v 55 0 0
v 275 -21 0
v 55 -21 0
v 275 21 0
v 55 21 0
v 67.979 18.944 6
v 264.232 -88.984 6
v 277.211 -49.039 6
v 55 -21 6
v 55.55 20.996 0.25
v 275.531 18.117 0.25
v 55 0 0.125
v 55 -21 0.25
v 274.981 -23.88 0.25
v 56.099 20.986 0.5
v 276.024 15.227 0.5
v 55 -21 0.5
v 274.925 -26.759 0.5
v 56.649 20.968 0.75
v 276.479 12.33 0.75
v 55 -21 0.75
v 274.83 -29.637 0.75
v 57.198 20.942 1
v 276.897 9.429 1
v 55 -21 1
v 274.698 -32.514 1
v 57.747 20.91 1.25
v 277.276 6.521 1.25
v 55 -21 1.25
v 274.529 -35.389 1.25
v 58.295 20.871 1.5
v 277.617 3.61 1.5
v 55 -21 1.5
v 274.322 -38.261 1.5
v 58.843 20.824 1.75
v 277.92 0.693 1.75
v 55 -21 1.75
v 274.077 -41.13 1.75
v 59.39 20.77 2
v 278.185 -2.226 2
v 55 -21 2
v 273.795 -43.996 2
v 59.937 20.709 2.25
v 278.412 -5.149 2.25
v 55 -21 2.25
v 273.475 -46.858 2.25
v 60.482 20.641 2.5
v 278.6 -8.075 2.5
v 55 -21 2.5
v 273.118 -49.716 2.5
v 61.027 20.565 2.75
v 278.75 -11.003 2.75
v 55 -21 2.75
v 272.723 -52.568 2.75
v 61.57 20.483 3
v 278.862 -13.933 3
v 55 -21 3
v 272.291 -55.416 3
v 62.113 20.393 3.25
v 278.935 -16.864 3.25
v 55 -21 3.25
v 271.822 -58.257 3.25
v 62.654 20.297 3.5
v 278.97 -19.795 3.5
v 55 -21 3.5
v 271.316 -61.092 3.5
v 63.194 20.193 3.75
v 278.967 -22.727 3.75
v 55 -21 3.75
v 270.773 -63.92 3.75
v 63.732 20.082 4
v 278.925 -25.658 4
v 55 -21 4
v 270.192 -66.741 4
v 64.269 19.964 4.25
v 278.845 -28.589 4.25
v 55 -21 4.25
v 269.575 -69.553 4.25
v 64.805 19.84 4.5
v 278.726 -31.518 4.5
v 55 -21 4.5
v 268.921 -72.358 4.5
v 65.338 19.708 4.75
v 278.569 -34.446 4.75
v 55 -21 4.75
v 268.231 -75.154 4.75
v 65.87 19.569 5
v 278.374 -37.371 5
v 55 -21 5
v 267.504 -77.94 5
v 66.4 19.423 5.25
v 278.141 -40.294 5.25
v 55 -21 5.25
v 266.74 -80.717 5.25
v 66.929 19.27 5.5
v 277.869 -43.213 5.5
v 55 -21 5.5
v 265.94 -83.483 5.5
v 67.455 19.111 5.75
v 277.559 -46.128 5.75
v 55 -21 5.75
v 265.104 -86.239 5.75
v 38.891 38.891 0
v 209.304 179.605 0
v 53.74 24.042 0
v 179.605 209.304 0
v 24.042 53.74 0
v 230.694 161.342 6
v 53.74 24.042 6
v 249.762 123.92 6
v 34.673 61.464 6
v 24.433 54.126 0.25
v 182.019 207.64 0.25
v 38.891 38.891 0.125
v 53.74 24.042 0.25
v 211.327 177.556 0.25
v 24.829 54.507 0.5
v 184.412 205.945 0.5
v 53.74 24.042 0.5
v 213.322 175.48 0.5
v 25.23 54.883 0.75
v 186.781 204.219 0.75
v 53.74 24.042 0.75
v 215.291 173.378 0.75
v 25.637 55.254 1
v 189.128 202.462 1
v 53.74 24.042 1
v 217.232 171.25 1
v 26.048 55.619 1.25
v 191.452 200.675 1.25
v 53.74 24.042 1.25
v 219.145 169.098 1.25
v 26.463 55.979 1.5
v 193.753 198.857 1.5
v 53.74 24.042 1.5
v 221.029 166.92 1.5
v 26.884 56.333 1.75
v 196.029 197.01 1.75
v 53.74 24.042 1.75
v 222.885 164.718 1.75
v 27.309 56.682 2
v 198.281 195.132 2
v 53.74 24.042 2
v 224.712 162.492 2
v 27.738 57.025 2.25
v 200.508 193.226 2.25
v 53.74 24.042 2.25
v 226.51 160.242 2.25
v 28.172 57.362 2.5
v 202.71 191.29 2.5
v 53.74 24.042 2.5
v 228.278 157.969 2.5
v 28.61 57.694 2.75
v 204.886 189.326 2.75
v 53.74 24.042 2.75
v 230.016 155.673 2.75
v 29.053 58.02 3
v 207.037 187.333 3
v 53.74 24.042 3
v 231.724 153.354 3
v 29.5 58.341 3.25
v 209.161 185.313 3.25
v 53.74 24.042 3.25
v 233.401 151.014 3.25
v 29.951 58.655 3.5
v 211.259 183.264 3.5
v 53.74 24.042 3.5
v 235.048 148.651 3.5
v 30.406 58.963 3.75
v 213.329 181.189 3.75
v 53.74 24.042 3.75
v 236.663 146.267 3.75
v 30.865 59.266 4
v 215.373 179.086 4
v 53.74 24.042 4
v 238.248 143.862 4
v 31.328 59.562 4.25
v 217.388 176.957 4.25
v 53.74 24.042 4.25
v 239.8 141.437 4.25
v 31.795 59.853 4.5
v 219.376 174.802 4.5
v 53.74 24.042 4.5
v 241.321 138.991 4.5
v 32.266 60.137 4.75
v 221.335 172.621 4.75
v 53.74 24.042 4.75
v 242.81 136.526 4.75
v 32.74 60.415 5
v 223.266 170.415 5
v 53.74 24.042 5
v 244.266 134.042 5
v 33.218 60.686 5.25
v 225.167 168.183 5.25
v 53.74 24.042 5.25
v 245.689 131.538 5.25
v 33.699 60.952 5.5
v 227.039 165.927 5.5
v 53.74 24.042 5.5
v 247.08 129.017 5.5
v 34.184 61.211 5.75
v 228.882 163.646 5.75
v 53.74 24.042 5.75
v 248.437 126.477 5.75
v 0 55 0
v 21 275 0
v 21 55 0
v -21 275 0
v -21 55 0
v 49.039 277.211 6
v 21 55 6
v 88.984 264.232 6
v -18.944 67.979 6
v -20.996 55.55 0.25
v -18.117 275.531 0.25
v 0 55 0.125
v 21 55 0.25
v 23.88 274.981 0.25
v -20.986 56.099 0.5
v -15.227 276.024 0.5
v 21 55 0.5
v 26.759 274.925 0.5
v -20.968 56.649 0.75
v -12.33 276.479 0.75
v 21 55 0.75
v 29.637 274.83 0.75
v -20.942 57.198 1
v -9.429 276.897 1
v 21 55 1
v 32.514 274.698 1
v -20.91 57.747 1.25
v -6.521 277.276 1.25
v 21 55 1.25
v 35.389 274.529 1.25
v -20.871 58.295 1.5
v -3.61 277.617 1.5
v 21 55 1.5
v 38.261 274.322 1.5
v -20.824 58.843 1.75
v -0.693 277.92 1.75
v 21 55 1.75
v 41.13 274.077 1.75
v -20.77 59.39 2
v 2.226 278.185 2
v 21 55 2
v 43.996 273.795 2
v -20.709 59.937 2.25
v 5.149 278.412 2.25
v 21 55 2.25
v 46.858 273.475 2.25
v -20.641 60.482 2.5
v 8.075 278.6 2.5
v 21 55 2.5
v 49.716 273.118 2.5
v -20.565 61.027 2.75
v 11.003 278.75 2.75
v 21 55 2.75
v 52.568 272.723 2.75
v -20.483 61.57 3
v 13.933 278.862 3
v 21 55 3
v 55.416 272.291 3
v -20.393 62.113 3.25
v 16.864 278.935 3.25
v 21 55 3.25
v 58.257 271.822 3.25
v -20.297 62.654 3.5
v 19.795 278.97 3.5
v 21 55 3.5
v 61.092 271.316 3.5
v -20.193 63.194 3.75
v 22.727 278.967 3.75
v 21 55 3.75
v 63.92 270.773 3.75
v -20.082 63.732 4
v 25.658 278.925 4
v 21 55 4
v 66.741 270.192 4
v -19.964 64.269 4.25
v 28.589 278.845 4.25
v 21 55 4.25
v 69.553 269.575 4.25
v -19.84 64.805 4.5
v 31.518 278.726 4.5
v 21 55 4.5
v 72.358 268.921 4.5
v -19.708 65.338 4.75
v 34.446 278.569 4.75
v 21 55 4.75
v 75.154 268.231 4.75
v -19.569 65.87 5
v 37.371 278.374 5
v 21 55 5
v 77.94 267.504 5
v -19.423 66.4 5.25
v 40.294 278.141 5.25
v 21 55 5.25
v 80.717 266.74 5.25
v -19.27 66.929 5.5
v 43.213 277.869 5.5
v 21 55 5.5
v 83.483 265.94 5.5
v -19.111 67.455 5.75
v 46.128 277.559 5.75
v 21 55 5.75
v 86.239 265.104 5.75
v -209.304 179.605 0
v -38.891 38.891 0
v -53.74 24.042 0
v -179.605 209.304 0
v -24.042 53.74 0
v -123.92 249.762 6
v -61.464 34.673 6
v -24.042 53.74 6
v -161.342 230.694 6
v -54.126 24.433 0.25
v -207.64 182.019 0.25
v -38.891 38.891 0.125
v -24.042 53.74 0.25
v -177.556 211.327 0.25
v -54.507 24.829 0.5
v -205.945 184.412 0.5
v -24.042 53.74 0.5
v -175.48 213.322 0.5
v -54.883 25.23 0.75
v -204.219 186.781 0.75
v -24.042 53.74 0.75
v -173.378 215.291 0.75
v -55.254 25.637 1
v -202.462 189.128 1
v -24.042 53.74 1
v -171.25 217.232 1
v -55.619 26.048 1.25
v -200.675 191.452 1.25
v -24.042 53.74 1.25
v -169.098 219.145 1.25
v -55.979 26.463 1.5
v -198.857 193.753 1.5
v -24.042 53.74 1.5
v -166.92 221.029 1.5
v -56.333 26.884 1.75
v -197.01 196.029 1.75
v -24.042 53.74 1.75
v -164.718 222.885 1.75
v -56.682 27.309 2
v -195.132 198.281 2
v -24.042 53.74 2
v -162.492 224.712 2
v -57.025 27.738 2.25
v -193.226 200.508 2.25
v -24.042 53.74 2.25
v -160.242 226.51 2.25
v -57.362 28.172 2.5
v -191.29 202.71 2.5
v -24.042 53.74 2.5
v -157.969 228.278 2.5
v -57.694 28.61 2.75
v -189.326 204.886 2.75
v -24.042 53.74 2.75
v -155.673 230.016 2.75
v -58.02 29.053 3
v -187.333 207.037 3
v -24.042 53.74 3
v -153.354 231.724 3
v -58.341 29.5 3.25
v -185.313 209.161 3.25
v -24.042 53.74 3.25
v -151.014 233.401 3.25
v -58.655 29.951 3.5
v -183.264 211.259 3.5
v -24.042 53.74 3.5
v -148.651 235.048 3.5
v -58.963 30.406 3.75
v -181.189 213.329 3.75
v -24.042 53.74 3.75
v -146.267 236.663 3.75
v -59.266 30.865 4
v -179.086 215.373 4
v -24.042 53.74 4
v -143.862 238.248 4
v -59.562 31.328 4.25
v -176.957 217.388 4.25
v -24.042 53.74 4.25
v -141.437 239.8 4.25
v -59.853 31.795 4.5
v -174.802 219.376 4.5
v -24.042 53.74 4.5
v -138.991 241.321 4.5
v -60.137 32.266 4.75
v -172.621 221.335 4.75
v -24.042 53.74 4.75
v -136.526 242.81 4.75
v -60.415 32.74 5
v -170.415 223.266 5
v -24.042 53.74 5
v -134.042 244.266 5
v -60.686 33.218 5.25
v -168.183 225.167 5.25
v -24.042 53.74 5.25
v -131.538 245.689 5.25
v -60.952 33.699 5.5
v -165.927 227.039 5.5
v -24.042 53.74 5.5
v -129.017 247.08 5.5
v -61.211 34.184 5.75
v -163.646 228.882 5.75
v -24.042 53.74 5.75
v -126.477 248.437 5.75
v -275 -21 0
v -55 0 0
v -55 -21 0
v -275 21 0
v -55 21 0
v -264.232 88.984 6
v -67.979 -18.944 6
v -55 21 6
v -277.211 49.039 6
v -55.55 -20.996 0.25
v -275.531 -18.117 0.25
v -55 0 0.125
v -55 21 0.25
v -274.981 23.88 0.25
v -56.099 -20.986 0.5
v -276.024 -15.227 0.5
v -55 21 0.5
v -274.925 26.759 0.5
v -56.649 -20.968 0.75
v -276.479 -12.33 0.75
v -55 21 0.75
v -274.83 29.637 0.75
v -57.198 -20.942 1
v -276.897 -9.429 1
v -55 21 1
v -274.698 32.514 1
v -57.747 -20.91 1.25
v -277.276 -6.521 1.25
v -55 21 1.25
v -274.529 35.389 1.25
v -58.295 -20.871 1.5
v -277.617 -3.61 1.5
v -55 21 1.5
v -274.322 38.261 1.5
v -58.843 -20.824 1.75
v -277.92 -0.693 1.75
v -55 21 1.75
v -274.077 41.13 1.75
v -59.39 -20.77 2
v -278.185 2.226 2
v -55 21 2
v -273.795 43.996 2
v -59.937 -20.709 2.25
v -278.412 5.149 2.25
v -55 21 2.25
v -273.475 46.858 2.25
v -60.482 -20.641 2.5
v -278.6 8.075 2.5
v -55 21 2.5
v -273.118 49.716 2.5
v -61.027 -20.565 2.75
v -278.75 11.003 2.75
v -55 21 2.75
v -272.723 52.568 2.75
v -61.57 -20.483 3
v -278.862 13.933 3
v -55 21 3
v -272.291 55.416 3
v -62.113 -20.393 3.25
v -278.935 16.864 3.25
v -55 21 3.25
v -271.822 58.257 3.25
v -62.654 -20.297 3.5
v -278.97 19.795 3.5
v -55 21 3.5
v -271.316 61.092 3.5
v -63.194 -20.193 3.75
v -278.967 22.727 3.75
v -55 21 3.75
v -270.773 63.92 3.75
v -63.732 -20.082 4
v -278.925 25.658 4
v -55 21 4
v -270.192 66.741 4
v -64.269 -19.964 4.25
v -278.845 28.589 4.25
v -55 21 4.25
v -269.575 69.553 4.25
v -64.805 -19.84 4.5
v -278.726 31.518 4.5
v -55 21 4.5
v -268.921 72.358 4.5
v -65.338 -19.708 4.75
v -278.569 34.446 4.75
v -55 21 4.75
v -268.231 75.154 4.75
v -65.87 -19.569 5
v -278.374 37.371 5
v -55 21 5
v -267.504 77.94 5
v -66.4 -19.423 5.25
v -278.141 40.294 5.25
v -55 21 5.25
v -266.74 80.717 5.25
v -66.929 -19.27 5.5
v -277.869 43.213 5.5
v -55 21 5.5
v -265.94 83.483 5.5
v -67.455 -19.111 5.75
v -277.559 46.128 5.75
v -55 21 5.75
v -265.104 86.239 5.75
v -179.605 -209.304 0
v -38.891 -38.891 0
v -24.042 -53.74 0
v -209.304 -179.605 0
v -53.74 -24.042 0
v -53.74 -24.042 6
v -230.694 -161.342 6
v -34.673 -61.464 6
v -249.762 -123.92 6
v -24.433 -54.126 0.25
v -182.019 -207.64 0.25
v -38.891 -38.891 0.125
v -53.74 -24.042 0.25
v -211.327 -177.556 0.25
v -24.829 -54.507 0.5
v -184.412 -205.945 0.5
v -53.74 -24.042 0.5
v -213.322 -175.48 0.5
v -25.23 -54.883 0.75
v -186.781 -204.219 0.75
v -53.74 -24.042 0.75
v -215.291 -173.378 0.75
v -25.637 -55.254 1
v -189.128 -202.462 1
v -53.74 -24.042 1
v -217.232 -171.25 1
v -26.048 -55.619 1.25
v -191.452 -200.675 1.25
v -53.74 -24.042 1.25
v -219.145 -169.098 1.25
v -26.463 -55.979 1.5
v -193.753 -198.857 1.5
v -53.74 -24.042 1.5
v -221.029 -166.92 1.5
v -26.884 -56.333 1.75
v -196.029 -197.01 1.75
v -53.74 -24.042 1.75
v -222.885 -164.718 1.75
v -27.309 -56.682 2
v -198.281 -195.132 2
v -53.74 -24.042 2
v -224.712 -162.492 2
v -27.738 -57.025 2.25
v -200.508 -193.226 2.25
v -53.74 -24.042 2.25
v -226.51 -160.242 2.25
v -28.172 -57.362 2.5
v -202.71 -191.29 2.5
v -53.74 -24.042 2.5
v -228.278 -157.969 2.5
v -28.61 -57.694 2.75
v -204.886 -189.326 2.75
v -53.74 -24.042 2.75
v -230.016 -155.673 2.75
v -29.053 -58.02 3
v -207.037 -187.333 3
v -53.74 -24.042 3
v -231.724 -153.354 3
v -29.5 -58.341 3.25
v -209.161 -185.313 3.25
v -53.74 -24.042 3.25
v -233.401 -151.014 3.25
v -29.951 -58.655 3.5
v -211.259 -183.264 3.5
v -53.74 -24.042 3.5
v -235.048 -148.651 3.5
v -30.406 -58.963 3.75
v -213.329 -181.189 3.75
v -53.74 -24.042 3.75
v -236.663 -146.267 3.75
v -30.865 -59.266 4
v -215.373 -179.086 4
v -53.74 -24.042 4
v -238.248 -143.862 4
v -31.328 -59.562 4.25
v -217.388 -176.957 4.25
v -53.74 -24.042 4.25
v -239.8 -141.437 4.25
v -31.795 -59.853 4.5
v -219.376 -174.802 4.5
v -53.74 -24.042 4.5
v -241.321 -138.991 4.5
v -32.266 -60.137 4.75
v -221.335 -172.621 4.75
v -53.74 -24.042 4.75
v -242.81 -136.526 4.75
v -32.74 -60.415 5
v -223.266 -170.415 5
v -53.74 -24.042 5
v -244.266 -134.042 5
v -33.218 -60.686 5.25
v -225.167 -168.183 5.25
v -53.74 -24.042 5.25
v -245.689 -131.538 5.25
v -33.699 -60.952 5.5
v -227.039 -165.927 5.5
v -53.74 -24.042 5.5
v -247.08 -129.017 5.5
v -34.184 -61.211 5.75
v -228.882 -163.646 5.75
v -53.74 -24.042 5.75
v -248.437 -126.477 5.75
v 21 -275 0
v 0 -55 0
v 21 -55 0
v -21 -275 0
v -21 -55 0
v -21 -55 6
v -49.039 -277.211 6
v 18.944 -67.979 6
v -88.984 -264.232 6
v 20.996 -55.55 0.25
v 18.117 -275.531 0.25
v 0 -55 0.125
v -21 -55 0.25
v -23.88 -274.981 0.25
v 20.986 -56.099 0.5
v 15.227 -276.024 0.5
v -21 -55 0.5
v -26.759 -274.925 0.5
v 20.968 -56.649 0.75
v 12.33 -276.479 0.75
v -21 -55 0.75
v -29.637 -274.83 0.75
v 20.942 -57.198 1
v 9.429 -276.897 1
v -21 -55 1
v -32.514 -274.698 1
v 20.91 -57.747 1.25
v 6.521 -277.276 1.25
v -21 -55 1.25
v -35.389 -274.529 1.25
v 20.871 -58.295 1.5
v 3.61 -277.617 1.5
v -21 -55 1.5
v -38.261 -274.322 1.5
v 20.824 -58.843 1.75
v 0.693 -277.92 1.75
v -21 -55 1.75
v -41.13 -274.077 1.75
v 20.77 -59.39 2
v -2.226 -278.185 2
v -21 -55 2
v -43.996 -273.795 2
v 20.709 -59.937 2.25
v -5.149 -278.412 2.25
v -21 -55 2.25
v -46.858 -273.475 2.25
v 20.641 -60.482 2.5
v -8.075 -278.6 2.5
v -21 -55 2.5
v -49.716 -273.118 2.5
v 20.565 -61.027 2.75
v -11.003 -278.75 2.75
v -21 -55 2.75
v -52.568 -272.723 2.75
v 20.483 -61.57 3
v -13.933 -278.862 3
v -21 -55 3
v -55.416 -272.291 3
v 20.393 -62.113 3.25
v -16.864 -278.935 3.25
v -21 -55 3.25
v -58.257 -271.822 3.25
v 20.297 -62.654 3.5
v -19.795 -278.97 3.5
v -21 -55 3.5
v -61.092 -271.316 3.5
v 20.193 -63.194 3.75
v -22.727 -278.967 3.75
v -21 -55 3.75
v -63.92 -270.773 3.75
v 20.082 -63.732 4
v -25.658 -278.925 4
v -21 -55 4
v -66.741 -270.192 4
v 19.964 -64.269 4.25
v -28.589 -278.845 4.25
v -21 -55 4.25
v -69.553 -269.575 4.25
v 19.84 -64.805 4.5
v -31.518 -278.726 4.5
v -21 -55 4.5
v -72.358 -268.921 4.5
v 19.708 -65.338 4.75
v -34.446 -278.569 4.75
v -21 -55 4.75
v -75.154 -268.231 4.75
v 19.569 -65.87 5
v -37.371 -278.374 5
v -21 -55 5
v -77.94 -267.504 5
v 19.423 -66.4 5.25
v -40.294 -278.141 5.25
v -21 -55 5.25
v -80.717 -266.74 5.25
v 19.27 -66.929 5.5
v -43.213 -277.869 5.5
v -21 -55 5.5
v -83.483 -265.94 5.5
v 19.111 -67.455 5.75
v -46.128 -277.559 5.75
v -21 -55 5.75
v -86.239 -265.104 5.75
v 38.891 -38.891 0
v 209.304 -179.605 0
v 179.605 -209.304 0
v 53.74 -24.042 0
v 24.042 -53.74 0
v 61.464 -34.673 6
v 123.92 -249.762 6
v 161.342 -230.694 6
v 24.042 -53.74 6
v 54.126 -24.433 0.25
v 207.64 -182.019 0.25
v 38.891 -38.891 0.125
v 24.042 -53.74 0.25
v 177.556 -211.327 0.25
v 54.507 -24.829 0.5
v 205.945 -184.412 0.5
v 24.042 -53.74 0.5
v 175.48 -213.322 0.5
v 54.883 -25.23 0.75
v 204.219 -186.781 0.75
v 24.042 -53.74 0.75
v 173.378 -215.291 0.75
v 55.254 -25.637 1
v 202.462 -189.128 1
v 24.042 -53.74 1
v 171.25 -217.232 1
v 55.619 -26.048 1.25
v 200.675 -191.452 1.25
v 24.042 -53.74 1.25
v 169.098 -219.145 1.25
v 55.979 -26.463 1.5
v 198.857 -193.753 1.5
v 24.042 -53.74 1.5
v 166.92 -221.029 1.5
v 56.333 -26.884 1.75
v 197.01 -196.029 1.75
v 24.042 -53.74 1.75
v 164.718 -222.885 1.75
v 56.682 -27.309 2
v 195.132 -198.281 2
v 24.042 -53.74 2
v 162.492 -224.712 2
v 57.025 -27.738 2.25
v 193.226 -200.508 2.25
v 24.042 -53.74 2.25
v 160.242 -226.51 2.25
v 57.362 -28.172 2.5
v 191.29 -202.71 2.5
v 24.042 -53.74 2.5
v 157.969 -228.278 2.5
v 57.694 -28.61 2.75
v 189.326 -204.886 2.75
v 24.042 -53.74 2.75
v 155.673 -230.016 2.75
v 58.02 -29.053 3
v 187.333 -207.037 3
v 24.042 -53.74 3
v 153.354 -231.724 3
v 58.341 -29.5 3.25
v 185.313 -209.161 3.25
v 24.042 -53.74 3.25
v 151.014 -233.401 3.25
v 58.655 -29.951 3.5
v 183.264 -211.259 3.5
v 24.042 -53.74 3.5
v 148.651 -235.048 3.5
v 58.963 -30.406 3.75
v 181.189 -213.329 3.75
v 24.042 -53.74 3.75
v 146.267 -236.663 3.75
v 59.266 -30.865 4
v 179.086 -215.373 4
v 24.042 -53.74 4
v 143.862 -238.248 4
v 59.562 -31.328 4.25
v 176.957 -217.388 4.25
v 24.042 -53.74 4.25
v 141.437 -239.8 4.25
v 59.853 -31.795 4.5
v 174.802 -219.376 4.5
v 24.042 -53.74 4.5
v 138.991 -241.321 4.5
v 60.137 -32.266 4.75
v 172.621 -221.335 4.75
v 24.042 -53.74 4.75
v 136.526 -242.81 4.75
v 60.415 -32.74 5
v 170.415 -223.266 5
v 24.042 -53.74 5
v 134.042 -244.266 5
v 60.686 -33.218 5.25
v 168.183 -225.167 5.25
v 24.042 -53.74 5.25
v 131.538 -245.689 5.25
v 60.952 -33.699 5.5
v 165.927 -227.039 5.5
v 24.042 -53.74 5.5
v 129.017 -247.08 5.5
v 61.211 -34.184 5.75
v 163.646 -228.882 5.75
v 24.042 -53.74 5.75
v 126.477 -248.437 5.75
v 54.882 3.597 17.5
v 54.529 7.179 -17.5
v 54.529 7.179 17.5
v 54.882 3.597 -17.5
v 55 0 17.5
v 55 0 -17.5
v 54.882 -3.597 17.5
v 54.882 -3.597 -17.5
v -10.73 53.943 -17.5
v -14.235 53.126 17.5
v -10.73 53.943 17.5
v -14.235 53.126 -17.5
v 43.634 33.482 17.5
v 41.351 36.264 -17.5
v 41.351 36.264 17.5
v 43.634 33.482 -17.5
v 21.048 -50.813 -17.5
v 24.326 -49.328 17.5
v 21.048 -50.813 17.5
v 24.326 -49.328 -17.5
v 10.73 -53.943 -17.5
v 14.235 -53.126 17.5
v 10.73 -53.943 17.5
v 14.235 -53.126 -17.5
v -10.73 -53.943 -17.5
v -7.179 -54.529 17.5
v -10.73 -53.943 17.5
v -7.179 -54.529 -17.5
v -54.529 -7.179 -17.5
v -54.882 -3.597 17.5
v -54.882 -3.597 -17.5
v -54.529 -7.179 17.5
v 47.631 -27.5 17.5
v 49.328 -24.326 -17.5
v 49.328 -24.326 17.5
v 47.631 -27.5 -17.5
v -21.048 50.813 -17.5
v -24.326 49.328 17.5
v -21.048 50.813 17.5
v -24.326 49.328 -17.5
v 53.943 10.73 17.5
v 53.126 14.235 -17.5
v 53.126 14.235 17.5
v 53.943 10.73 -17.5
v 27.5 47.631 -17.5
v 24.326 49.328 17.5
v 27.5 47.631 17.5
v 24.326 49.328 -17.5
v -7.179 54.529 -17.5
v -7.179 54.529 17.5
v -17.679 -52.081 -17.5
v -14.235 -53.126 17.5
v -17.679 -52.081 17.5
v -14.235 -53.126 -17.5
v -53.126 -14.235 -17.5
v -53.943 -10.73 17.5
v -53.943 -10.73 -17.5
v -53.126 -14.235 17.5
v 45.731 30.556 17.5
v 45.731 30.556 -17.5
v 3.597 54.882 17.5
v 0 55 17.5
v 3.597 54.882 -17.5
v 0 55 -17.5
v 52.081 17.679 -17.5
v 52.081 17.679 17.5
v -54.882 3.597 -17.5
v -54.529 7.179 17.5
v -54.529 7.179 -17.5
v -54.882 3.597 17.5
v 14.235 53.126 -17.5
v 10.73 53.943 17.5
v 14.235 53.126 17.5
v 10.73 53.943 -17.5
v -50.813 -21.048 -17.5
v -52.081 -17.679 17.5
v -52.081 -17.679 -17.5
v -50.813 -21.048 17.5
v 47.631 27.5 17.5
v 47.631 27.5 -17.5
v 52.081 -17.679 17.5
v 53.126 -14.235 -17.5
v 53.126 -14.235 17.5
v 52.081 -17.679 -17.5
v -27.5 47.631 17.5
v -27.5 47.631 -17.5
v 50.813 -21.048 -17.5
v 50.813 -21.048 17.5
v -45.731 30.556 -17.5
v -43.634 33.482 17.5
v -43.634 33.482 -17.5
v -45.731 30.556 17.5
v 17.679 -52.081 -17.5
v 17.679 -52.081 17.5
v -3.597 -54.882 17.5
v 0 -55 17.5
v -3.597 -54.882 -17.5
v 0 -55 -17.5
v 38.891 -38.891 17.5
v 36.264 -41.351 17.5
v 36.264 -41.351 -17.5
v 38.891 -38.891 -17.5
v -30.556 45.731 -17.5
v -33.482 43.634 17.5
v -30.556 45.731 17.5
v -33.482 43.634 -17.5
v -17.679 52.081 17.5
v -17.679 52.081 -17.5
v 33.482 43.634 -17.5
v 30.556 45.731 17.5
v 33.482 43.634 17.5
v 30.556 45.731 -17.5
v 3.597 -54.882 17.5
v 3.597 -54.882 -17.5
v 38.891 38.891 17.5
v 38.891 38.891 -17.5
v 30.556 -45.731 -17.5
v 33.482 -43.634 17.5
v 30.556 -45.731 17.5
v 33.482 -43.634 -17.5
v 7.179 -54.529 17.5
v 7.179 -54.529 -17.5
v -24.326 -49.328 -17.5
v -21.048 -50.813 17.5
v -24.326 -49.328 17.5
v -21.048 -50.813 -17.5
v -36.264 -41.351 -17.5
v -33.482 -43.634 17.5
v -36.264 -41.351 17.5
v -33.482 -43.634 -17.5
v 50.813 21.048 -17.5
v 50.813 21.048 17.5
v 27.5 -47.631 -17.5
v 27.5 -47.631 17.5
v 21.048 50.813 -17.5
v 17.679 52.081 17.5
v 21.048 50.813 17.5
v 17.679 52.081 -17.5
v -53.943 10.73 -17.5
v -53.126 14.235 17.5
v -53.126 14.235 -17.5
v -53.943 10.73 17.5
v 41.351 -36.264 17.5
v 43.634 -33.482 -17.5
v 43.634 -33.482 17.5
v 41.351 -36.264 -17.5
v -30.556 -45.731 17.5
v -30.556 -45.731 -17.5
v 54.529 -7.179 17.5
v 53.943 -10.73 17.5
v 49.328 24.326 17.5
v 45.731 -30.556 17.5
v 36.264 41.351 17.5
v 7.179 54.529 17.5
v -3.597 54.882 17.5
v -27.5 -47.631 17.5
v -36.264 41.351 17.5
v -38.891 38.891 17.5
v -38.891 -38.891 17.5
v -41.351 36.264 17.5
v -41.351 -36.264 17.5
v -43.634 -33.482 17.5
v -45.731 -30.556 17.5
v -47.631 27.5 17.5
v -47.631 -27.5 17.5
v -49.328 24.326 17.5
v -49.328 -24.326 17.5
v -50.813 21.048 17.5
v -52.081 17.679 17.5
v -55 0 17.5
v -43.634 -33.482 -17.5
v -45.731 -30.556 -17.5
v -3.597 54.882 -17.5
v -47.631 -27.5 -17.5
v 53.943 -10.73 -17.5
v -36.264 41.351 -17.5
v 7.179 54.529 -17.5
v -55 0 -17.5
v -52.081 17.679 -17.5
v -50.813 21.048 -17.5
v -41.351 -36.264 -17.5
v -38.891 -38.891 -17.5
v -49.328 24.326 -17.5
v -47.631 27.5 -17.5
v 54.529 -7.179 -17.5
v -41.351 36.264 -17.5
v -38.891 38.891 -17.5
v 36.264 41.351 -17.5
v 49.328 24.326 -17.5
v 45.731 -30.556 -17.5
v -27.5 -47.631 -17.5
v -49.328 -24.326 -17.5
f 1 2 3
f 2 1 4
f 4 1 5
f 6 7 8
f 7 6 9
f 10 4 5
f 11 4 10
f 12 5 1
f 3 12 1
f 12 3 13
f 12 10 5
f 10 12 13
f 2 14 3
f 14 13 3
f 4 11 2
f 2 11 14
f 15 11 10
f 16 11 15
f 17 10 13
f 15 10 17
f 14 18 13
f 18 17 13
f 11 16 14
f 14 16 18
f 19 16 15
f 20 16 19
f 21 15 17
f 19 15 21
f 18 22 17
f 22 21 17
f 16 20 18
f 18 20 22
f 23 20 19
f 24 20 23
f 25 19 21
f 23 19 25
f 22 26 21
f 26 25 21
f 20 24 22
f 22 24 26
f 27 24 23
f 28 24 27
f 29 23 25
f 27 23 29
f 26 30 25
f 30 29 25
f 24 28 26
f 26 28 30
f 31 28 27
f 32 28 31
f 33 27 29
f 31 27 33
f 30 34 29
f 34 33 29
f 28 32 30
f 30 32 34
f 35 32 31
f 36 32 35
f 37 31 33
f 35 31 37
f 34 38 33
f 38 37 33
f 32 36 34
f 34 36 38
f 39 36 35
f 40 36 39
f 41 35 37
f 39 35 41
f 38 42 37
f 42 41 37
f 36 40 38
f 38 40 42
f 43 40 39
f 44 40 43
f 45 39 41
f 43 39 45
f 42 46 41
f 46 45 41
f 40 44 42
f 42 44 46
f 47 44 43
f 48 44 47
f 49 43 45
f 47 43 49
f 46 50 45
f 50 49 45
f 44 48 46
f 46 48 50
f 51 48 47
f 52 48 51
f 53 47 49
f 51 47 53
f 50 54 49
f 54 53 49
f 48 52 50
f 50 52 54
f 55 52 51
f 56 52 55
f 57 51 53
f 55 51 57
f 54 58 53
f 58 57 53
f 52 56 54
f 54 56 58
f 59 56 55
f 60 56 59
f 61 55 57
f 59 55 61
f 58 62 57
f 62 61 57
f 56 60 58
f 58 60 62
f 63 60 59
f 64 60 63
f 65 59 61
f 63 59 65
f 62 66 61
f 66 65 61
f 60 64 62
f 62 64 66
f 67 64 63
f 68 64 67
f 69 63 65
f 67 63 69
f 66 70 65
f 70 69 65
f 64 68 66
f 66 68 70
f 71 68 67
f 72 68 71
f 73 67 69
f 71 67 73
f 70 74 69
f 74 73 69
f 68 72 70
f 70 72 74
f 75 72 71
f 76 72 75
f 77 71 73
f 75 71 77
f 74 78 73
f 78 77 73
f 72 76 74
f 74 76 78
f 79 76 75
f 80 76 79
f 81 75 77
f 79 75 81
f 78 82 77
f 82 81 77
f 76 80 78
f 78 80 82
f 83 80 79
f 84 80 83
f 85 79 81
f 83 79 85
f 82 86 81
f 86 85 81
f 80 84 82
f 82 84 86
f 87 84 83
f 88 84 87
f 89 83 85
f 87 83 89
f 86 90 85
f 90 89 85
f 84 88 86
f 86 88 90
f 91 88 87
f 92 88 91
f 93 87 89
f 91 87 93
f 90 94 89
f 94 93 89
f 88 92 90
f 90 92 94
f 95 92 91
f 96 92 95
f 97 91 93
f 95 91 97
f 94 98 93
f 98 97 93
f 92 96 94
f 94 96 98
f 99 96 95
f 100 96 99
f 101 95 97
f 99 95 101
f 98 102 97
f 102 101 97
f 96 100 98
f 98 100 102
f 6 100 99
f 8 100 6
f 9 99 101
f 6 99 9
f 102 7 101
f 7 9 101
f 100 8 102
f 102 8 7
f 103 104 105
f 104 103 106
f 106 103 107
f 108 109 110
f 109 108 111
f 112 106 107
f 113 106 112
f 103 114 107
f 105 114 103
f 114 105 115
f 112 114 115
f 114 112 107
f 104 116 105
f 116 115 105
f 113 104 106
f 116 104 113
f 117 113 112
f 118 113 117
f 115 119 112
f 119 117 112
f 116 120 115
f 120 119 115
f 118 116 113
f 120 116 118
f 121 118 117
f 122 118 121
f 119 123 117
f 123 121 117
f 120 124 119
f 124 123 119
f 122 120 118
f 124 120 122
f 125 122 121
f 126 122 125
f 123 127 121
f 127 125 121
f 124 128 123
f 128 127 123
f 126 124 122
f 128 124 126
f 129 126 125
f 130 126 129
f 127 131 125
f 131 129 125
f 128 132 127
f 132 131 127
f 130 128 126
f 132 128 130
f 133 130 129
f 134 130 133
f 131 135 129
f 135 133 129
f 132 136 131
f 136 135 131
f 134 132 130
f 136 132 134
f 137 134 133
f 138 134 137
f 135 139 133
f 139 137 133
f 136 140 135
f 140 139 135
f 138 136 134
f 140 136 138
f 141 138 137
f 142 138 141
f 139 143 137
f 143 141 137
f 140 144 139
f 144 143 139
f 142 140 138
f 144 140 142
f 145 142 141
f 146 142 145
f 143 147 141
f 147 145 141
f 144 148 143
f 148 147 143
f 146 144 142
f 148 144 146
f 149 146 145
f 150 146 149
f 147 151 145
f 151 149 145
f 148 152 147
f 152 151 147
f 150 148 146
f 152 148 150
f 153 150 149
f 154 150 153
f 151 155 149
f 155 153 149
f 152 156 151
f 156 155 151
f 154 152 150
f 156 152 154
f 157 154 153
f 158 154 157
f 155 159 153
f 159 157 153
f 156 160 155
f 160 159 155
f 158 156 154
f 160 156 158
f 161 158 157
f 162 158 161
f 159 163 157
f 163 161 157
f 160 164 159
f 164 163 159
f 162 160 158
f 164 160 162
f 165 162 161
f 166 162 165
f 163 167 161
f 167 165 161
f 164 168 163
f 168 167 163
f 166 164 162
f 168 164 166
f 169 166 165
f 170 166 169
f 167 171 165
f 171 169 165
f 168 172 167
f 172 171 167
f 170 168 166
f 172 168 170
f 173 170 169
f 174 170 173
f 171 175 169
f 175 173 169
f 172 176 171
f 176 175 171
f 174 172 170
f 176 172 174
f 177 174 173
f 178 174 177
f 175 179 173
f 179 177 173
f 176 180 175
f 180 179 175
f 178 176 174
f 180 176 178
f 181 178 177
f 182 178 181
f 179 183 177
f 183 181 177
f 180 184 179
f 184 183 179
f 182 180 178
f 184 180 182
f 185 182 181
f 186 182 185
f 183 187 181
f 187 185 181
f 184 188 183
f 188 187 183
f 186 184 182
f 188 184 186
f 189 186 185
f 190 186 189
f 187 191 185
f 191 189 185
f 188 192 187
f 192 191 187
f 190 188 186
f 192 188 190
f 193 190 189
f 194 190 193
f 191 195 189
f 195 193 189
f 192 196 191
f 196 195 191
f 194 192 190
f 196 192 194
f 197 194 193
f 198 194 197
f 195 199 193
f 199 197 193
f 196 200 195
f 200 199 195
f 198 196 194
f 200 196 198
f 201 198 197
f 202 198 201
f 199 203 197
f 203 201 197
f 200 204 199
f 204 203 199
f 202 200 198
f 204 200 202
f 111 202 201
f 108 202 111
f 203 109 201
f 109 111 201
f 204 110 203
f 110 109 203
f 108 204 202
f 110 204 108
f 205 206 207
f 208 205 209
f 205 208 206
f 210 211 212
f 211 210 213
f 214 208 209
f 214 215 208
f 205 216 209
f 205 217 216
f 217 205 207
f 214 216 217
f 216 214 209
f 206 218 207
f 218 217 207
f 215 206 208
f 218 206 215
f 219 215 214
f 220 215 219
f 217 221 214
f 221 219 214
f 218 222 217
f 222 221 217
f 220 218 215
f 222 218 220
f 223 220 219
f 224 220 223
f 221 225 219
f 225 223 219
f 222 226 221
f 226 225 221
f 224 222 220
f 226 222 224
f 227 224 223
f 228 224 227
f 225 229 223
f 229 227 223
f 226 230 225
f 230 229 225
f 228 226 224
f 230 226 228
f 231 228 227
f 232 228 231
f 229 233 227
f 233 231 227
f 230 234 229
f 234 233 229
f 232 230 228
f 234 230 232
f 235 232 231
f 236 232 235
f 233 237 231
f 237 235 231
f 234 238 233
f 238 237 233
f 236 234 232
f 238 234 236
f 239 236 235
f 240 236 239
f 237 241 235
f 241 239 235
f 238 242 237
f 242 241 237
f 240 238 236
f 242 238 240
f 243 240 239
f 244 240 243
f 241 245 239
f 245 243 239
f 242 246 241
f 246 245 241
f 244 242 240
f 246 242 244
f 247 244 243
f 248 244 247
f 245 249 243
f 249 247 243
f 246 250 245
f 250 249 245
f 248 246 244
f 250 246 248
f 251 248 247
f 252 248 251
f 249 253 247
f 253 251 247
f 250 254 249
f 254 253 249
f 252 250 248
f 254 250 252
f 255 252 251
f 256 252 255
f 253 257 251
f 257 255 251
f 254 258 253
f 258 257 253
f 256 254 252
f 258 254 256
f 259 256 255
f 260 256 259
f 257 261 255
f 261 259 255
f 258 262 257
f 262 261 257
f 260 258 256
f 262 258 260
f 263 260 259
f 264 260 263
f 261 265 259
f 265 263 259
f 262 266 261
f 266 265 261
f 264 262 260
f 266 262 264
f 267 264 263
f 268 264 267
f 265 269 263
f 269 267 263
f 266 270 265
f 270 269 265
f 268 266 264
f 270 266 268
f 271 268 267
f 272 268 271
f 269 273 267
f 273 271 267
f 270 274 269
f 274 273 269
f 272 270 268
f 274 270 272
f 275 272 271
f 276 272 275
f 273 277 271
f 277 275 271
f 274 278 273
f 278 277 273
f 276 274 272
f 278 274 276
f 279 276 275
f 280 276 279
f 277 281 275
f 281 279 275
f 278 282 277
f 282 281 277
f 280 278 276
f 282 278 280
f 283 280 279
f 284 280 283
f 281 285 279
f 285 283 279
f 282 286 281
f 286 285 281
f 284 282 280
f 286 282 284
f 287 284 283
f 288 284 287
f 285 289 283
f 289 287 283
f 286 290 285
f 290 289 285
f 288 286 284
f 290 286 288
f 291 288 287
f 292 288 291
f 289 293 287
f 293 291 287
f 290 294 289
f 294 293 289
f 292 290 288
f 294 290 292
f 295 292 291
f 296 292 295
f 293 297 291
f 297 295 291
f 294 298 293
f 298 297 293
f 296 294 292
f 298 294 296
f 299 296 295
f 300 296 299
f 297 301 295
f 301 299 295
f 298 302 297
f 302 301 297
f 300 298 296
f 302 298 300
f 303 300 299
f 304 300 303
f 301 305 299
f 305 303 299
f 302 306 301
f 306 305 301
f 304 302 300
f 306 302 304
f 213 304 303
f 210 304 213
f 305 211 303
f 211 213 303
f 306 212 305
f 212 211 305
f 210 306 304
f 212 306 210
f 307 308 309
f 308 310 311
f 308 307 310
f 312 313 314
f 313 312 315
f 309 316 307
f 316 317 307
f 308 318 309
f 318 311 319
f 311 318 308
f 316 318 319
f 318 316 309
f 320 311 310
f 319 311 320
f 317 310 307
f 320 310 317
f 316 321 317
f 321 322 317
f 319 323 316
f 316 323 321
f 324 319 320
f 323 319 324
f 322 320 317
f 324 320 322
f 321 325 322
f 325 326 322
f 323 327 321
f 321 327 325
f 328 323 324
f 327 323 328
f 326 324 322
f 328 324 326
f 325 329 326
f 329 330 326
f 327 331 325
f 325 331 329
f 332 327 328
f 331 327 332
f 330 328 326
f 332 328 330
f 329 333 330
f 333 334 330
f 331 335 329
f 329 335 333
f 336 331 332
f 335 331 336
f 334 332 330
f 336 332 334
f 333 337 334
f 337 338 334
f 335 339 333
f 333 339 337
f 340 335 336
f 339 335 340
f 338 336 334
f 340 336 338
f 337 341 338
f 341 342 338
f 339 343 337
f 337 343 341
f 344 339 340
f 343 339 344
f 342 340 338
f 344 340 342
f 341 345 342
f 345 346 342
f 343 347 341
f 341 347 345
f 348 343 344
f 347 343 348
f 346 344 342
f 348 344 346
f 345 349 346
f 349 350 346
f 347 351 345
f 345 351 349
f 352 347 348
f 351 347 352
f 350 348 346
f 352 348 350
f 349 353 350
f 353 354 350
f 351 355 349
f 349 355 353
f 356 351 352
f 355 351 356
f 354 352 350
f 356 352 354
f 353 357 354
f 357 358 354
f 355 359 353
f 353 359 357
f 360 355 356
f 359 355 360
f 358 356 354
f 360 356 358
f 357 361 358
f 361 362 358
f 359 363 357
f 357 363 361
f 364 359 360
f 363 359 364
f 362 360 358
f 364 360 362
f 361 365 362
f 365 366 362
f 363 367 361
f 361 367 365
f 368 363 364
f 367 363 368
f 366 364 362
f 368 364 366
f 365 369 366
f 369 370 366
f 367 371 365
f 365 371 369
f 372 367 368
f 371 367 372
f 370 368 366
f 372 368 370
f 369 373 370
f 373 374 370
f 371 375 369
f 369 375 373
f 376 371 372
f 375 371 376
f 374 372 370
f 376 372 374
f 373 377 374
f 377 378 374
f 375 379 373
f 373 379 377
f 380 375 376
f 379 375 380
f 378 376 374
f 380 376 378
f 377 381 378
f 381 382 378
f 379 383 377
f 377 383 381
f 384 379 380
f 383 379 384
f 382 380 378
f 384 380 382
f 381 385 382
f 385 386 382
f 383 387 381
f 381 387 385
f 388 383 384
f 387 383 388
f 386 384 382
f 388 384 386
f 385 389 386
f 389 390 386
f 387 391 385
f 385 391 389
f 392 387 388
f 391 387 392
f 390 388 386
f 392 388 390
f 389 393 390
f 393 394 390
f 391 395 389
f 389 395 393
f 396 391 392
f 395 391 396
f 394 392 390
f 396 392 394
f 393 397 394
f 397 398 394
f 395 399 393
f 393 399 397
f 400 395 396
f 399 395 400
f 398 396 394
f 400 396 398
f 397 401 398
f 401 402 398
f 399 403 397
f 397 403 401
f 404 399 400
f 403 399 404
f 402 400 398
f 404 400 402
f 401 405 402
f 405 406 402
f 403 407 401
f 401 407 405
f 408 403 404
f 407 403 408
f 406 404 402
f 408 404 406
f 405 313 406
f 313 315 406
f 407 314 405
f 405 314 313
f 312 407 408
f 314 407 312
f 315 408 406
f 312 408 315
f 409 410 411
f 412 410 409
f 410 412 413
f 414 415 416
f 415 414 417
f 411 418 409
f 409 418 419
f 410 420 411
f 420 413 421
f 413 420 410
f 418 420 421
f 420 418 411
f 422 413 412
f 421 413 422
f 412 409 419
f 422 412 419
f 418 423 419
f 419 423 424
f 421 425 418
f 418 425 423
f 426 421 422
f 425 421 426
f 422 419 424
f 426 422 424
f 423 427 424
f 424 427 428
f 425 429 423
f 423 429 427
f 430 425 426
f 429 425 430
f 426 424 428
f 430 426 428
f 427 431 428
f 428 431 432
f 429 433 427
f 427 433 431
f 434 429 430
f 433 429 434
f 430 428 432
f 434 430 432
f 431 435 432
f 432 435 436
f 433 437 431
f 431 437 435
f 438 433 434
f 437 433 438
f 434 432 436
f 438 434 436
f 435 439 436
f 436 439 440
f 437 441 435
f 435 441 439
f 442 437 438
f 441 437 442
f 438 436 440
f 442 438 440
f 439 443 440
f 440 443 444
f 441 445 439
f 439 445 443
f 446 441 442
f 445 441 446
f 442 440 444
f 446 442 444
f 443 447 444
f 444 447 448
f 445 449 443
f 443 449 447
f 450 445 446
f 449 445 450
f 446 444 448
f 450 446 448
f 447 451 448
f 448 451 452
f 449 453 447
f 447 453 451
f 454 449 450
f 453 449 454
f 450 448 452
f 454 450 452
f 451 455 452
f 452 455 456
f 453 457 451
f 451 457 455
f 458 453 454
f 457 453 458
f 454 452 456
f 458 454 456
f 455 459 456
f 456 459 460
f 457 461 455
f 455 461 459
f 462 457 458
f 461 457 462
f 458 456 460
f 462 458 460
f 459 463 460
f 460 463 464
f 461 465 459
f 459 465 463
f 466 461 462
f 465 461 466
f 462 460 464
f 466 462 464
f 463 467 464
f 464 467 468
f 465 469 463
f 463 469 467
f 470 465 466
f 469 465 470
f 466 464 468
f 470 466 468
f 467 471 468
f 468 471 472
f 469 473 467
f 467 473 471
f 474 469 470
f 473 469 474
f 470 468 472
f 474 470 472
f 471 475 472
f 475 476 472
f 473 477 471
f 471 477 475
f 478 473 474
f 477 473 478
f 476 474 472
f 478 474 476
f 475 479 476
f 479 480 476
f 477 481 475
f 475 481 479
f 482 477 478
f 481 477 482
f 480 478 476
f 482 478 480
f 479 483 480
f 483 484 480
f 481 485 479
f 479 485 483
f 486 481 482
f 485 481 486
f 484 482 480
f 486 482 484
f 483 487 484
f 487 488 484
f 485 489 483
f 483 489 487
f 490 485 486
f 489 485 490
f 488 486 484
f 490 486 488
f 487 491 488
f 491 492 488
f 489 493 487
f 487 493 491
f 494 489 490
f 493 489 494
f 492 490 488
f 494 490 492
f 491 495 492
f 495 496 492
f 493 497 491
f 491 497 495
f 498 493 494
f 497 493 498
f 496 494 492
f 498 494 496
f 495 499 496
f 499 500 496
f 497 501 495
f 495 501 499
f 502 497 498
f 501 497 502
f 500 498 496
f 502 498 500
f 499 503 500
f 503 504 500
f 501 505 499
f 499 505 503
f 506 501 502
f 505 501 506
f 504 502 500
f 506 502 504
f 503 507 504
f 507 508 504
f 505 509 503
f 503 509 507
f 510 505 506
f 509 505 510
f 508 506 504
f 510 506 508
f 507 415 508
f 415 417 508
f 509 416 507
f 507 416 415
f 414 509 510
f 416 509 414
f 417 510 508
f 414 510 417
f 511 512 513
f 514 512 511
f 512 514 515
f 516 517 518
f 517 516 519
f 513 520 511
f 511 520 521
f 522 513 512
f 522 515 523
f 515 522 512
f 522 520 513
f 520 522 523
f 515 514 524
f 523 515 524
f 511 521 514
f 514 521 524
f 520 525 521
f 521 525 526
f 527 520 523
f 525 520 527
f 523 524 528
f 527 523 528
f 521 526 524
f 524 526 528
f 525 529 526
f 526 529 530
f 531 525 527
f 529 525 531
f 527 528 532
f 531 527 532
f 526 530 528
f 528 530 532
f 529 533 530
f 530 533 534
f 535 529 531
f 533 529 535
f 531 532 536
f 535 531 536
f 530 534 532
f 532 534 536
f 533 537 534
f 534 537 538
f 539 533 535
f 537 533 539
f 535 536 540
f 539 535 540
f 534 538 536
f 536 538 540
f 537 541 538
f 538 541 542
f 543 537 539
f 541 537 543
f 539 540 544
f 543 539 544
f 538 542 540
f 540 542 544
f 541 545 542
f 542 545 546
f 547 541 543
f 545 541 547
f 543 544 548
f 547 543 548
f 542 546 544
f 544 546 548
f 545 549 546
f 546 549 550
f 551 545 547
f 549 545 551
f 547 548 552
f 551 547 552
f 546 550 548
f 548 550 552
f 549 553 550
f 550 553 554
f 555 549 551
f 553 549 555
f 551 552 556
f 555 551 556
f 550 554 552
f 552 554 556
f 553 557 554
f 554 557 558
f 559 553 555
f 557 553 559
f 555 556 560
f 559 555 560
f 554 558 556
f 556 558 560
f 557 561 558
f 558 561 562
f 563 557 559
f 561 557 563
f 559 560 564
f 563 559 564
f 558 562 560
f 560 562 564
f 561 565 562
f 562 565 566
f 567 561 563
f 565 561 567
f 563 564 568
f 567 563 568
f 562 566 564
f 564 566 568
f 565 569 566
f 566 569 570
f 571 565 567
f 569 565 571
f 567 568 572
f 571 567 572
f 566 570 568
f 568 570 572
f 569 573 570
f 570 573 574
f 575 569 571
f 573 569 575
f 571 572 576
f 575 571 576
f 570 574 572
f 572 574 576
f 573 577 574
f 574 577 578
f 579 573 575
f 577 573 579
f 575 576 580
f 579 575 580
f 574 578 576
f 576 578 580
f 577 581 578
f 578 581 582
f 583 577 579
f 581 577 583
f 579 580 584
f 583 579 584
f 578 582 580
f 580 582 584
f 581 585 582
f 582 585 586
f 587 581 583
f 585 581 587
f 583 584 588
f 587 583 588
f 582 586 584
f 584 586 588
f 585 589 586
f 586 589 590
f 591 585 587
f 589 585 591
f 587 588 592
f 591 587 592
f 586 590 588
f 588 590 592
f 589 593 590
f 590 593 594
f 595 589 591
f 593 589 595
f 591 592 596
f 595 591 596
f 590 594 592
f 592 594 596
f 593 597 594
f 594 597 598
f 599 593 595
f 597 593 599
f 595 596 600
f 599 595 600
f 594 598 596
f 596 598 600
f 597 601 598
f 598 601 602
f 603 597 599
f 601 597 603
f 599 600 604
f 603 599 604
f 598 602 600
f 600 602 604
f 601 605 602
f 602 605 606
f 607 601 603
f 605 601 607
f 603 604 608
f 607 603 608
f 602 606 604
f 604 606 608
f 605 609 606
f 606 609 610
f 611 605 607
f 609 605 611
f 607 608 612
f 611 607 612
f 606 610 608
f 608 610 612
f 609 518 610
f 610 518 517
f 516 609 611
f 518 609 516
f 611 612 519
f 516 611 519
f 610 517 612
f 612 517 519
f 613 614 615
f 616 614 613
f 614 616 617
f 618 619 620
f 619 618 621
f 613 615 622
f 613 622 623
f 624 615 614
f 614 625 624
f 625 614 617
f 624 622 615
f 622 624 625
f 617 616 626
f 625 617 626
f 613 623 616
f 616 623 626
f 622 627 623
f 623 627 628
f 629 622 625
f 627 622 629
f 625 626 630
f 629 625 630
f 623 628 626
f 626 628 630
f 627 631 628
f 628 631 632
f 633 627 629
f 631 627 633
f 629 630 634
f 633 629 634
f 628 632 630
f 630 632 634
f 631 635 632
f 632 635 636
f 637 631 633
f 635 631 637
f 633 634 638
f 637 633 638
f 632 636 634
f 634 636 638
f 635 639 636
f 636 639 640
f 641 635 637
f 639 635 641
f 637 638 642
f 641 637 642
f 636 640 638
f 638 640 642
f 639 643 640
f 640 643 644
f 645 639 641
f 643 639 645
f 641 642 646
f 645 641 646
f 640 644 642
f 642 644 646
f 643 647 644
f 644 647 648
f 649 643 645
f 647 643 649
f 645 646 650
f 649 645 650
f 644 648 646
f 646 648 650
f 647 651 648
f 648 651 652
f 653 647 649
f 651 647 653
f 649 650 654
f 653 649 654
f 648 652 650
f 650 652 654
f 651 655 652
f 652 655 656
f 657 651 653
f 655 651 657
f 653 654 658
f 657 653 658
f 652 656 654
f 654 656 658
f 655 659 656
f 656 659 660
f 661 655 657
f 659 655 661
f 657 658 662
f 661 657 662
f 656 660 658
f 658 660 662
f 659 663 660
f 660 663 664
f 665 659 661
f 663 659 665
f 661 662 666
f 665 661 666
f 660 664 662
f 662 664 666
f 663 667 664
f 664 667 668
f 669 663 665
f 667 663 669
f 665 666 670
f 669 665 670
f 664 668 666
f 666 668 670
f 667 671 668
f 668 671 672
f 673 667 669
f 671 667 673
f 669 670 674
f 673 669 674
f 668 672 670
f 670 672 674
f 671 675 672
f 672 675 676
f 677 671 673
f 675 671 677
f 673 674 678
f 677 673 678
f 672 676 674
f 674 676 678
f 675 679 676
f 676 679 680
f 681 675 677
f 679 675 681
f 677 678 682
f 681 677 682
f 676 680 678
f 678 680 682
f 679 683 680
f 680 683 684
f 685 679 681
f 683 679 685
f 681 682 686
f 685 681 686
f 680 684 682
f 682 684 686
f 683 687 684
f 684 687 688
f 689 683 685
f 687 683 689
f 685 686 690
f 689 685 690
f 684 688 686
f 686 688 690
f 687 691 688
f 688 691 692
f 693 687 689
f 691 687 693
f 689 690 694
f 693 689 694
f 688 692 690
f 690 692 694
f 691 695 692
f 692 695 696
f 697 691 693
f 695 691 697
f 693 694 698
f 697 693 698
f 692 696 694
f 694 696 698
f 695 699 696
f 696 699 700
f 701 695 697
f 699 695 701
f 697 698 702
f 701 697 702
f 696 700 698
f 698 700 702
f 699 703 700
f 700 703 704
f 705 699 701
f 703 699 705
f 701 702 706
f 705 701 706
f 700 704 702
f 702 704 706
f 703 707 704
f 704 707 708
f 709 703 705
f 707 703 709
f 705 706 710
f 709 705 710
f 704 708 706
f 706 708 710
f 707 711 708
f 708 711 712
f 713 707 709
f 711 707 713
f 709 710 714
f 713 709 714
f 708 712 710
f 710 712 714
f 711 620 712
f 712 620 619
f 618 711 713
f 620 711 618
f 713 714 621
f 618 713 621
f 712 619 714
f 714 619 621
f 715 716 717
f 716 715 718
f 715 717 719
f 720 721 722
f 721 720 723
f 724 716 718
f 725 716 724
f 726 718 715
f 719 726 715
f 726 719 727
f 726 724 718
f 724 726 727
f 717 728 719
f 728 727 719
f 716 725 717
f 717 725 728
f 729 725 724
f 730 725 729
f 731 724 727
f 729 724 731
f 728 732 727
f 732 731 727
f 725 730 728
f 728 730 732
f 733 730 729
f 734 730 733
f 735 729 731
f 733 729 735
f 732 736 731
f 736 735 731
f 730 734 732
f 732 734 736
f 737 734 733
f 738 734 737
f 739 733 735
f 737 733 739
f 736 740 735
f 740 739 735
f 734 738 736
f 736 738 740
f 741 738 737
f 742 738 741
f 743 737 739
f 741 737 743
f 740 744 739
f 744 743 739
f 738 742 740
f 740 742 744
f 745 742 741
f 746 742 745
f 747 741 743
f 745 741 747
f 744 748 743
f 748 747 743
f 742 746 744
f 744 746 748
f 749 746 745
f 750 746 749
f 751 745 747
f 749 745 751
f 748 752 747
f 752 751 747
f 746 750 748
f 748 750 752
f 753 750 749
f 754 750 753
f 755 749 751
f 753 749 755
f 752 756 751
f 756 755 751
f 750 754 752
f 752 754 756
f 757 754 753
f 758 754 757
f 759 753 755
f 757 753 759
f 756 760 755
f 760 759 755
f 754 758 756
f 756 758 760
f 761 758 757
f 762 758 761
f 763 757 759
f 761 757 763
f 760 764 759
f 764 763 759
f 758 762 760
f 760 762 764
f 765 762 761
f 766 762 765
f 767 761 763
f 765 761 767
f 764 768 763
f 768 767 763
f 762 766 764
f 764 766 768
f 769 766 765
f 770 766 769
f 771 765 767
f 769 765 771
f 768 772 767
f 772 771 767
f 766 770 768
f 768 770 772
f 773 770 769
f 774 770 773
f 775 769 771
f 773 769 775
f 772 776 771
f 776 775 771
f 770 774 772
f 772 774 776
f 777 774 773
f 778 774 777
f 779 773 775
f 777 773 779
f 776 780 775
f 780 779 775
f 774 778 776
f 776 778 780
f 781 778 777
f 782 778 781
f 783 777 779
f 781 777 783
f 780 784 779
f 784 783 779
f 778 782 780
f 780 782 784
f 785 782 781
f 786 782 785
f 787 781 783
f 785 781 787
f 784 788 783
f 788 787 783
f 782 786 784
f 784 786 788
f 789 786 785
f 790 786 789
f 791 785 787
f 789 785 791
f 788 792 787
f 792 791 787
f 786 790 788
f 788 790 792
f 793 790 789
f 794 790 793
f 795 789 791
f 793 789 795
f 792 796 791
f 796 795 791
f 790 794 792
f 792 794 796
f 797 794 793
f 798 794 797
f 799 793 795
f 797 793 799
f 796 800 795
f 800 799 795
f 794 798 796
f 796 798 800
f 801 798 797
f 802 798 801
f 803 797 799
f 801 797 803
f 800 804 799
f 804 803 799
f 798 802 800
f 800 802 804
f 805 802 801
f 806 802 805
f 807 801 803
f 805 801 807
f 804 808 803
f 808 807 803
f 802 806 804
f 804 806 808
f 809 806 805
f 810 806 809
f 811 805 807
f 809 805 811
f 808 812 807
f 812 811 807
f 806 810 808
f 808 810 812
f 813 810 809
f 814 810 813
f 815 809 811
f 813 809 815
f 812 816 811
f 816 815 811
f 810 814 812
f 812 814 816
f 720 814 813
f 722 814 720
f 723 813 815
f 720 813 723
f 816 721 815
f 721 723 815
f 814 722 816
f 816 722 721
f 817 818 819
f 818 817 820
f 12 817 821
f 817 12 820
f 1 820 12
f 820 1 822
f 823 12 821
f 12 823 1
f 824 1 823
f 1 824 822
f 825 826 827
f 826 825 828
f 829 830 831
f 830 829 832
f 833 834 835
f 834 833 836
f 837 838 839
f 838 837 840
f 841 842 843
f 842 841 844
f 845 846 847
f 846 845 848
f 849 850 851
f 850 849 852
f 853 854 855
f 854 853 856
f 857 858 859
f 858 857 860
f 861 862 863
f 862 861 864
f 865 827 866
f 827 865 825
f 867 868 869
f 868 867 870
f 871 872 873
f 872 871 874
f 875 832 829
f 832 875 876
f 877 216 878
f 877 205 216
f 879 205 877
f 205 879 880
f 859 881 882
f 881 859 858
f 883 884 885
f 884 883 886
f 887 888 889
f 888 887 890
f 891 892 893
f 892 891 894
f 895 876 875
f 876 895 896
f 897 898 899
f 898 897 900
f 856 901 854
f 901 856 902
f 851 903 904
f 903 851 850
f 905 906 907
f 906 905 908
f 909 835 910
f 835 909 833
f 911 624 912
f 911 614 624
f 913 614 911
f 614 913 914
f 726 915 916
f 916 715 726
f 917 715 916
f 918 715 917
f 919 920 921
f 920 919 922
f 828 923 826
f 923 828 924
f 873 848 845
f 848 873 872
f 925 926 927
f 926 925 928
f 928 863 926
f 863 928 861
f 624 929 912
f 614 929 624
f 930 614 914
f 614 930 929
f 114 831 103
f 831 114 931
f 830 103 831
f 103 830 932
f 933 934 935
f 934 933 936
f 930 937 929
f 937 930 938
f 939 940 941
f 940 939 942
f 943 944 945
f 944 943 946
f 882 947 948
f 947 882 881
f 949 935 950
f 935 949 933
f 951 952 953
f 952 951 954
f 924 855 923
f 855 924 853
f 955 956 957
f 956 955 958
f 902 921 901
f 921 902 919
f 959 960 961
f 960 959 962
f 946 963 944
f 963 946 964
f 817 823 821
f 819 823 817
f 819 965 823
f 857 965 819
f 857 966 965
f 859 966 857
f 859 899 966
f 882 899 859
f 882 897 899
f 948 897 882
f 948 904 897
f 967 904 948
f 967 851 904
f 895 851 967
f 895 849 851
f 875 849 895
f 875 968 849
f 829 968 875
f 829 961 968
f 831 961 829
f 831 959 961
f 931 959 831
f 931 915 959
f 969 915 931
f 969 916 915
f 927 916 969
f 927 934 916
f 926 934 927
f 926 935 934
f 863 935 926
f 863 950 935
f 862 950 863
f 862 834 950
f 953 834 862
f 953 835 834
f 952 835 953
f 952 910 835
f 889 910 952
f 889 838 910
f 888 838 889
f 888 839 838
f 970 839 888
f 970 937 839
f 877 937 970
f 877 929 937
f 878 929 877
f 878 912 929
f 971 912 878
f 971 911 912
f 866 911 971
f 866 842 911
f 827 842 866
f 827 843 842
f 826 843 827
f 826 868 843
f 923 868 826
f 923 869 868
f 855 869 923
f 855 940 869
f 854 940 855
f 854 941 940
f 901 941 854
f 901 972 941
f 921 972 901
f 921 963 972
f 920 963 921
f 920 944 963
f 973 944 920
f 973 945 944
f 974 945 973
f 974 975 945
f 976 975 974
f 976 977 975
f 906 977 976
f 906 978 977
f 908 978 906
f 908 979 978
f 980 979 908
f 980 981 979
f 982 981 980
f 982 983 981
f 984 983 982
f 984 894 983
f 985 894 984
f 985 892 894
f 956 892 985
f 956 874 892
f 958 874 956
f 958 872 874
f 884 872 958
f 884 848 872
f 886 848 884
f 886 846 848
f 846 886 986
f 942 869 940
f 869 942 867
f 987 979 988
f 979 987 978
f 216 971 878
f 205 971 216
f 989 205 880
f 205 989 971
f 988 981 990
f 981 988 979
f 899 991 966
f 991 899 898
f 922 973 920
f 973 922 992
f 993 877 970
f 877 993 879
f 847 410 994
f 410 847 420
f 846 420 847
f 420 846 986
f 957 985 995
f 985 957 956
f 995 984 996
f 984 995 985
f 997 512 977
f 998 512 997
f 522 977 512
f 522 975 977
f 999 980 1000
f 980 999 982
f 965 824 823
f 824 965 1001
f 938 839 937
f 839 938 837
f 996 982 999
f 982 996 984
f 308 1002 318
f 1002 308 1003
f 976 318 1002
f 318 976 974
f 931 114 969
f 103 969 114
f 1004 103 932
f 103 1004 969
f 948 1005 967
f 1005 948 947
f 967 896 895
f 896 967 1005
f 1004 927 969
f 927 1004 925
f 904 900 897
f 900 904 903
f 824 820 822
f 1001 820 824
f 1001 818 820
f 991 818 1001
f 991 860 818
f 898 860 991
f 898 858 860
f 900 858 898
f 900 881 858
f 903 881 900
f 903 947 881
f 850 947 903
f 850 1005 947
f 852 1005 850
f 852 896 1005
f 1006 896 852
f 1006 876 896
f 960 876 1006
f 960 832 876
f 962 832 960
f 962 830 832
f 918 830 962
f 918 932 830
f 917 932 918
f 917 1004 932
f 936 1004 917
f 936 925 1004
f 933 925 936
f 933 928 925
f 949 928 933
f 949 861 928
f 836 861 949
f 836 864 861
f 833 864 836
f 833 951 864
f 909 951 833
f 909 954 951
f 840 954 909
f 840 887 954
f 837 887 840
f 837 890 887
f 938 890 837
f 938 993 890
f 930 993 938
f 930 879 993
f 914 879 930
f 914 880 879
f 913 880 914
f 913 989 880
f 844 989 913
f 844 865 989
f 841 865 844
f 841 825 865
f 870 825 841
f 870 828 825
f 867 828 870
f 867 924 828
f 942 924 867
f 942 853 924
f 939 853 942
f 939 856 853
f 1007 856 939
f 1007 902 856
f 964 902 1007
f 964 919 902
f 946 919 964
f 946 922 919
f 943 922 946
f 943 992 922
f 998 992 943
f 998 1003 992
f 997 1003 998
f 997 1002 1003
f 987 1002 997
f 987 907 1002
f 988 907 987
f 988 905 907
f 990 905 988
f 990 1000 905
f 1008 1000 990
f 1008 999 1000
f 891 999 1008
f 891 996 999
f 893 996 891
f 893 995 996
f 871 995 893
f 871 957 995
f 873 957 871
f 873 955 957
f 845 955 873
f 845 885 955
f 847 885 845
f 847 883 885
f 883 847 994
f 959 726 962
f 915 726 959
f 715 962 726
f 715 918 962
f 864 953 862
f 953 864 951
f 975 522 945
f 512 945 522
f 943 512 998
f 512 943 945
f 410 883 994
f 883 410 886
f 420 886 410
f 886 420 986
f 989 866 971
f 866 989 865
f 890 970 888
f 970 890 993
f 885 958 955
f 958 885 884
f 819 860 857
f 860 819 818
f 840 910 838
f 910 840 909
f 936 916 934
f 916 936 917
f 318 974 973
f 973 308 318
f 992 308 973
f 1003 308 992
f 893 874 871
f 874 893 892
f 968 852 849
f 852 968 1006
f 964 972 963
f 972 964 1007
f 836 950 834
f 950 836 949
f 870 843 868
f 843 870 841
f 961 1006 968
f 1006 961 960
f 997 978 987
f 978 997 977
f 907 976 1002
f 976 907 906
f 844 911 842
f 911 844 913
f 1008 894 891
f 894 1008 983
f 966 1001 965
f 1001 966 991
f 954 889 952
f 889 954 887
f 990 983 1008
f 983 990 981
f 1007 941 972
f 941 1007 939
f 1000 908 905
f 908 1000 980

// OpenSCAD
// Biupiu Blade / Micro-Turbine engineering blockout
// Concept geometry only — not a manufacturing or flight-certified design.
module blade(length=220, chord=42, thickness=6, twist=18) {
  linear_extrude(height=thickness, twist=twist, slices=24)
    polygon([[0,0],[length,0],[length,chord],[0,chord]]);
}
module hub(radius=55, height=35) { cylinder(r=radius, h=height, center=true, $fn=96); }
module rotor(blades=8) { hub(); for (i=[0:blades-1]) rotate([0,0,i*360/blades]) translate([55,-21,0]) blade(); }
rotor();
